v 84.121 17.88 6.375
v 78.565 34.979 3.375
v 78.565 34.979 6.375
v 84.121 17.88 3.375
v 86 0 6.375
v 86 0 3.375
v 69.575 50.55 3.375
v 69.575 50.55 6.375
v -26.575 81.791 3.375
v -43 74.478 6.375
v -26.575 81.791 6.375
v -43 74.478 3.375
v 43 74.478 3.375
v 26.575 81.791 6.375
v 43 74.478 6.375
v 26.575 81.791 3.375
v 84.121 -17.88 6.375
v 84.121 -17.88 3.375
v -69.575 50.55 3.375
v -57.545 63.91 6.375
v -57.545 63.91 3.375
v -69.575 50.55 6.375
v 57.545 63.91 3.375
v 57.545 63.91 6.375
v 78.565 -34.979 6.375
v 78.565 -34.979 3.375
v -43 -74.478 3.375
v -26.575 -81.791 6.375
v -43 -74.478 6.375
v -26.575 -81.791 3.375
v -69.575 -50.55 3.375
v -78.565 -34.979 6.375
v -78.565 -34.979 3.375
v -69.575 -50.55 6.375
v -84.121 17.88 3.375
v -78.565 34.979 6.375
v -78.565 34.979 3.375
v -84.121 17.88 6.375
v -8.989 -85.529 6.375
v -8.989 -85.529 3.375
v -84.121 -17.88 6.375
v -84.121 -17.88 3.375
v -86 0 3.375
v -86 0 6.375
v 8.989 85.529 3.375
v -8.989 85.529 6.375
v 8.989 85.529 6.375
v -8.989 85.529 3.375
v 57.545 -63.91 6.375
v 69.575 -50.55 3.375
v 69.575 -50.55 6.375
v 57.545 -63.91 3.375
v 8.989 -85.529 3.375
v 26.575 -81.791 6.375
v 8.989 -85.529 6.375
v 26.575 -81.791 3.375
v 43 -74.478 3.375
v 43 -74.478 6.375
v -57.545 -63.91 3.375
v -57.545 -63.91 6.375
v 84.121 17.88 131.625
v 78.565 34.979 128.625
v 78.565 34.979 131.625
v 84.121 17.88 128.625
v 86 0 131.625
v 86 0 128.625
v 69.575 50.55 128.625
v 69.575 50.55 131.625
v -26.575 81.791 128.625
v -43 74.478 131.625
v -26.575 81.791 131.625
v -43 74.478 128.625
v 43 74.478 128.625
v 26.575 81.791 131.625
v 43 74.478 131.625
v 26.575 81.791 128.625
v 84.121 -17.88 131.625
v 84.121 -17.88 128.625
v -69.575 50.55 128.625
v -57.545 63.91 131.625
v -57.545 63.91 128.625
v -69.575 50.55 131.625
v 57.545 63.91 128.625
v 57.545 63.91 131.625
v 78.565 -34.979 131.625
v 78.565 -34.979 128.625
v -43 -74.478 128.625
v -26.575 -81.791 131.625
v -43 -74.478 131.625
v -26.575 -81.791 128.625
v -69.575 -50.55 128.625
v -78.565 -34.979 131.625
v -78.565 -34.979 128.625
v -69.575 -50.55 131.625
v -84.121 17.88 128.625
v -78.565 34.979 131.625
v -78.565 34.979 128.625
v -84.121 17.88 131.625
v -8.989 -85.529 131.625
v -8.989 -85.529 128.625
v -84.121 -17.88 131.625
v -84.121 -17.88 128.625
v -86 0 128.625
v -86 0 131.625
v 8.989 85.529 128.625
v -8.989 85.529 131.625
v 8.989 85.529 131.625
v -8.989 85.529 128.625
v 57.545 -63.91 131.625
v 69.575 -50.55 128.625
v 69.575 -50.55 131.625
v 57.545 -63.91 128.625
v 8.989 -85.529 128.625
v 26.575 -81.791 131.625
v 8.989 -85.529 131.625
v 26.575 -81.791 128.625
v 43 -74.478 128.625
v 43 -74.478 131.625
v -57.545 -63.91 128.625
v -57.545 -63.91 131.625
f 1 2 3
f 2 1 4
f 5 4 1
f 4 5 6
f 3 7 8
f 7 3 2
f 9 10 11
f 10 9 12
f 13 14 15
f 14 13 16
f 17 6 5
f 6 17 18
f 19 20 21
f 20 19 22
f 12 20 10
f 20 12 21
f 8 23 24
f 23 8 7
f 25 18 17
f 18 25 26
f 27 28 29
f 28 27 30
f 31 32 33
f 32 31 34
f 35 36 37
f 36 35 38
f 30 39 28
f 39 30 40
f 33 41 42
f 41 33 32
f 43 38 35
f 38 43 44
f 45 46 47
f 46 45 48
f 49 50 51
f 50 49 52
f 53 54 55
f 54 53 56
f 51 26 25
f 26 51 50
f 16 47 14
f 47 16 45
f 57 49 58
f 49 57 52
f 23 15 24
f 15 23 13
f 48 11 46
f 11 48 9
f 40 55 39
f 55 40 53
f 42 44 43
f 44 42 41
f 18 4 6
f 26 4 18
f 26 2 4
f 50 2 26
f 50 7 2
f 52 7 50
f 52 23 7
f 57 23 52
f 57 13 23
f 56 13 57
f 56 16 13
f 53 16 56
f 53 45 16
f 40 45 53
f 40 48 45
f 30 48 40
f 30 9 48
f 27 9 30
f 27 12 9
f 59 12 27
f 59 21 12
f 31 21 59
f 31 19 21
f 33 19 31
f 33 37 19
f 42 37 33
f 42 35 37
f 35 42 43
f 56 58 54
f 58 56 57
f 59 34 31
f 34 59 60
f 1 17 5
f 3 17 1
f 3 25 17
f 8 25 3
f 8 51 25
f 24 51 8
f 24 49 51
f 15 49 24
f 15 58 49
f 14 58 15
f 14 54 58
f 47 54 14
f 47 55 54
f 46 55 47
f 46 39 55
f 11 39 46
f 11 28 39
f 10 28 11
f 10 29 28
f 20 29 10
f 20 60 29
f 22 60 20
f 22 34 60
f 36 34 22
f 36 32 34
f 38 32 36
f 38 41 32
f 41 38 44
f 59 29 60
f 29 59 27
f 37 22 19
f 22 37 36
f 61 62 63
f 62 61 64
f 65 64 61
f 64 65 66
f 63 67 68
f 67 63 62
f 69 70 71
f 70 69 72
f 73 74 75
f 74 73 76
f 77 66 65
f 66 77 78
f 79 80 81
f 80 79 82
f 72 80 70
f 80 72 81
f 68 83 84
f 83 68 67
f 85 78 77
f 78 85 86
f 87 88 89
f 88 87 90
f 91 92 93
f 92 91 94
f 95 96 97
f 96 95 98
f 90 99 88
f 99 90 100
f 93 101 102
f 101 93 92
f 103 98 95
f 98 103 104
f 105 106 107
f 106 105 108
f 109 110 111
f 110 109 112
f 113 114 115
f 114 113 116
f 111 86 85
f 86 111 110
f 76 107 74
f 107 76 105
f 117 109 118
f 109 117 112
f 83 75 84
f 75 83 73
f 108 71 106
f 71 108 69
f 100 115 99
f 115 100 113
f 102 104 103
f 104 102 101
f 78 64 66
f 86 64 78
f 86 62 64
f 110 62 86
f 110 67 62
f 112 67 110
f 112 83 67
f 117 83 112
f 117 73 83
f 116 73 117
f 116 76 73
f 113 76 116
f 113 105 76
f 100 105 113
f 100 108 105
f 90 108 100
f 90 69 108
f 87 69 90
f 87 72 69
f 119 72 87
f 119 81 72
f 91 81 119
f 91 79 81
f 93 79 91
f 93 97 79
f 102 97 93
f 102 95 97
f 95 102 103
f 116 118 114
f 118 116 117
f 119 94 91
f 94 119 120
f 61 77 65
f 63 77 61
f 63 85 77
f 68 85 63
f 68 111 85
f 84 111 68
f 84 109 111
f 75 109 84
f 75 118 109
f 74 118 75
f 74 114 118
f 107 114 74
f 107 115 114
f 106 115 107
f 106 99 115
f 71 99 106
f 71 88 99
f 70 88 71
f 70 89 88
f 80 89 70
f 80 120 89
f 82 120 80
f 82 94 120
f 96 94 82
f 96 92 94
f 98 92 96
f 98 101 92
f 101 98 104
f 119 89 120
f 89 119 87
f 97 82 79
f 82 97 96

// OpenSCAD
//Start with Cup Dimensions - these are for a Starbucks $1 Reusable Cup
bottom_diameter=59.5;
top_diameter=82;
//Make sure the height is measured as the distance between your top and bottom radius measurements!
height=135;

//Now some basic properties of your sleeve
color="aqua"; //[black,silver,gray,white,maroon,red,purple,fuchsia,green,lime,olive,yellow,navy,blue,teal,aqua,brown,sienna]
thickness=2; //[1:4]
border=3; //[1:30]
sleeve_height_percent=95;//[10:95]
//Use this to move the sleeve up or down on the cup
sleeve_z_offset=0;

//And finally the pattern variables...
line_thickness=4;
sides=6;//[3:20]
size=18;//[1:20]
overlap=5;//[0:10]
//This is the spin of each shape about its center
spin=22.5;//[-90:90]
//This is the amount the pattern is made to "spiral" around the cup, vs. stack straight up
pattern_spin=9;//[0:10]

part=1;//[1:Render,2:Final]

////////////////////////////////

bottom_radius=bottom_diameter/2;
top_radius=top_diameter/2;
rb=bottom_diameter/2+thickness;
rt=top_diameter/2+thickness;
h=height;
lt=line_thickness;
sh=sleeve_height_percent/100*h;
szo=sleeve_z_offset;

res=30;


theta=atan((rt-rb)/h);
count=24-size;
thetac=360/count;
rpb=rb*3.14/count;
rp=rpb*(1+overlap*.2);

rows=round(h/(2*rpb));
echo("val");
echo(h);
echo(sleeve_height_percent/100*h);
echo(sh);

echo(szo+(h-sh)/2);
translate([0,0,szo+(h-sh)/2])cylinder(r=rt*2,h=border,$fn=res);

echo(h-border+szo-(h-sh)/2);
translate([0,0,h-border+szo-(h-sh)/2])cylinder(r=rt*2,h=border,$fn=res);
